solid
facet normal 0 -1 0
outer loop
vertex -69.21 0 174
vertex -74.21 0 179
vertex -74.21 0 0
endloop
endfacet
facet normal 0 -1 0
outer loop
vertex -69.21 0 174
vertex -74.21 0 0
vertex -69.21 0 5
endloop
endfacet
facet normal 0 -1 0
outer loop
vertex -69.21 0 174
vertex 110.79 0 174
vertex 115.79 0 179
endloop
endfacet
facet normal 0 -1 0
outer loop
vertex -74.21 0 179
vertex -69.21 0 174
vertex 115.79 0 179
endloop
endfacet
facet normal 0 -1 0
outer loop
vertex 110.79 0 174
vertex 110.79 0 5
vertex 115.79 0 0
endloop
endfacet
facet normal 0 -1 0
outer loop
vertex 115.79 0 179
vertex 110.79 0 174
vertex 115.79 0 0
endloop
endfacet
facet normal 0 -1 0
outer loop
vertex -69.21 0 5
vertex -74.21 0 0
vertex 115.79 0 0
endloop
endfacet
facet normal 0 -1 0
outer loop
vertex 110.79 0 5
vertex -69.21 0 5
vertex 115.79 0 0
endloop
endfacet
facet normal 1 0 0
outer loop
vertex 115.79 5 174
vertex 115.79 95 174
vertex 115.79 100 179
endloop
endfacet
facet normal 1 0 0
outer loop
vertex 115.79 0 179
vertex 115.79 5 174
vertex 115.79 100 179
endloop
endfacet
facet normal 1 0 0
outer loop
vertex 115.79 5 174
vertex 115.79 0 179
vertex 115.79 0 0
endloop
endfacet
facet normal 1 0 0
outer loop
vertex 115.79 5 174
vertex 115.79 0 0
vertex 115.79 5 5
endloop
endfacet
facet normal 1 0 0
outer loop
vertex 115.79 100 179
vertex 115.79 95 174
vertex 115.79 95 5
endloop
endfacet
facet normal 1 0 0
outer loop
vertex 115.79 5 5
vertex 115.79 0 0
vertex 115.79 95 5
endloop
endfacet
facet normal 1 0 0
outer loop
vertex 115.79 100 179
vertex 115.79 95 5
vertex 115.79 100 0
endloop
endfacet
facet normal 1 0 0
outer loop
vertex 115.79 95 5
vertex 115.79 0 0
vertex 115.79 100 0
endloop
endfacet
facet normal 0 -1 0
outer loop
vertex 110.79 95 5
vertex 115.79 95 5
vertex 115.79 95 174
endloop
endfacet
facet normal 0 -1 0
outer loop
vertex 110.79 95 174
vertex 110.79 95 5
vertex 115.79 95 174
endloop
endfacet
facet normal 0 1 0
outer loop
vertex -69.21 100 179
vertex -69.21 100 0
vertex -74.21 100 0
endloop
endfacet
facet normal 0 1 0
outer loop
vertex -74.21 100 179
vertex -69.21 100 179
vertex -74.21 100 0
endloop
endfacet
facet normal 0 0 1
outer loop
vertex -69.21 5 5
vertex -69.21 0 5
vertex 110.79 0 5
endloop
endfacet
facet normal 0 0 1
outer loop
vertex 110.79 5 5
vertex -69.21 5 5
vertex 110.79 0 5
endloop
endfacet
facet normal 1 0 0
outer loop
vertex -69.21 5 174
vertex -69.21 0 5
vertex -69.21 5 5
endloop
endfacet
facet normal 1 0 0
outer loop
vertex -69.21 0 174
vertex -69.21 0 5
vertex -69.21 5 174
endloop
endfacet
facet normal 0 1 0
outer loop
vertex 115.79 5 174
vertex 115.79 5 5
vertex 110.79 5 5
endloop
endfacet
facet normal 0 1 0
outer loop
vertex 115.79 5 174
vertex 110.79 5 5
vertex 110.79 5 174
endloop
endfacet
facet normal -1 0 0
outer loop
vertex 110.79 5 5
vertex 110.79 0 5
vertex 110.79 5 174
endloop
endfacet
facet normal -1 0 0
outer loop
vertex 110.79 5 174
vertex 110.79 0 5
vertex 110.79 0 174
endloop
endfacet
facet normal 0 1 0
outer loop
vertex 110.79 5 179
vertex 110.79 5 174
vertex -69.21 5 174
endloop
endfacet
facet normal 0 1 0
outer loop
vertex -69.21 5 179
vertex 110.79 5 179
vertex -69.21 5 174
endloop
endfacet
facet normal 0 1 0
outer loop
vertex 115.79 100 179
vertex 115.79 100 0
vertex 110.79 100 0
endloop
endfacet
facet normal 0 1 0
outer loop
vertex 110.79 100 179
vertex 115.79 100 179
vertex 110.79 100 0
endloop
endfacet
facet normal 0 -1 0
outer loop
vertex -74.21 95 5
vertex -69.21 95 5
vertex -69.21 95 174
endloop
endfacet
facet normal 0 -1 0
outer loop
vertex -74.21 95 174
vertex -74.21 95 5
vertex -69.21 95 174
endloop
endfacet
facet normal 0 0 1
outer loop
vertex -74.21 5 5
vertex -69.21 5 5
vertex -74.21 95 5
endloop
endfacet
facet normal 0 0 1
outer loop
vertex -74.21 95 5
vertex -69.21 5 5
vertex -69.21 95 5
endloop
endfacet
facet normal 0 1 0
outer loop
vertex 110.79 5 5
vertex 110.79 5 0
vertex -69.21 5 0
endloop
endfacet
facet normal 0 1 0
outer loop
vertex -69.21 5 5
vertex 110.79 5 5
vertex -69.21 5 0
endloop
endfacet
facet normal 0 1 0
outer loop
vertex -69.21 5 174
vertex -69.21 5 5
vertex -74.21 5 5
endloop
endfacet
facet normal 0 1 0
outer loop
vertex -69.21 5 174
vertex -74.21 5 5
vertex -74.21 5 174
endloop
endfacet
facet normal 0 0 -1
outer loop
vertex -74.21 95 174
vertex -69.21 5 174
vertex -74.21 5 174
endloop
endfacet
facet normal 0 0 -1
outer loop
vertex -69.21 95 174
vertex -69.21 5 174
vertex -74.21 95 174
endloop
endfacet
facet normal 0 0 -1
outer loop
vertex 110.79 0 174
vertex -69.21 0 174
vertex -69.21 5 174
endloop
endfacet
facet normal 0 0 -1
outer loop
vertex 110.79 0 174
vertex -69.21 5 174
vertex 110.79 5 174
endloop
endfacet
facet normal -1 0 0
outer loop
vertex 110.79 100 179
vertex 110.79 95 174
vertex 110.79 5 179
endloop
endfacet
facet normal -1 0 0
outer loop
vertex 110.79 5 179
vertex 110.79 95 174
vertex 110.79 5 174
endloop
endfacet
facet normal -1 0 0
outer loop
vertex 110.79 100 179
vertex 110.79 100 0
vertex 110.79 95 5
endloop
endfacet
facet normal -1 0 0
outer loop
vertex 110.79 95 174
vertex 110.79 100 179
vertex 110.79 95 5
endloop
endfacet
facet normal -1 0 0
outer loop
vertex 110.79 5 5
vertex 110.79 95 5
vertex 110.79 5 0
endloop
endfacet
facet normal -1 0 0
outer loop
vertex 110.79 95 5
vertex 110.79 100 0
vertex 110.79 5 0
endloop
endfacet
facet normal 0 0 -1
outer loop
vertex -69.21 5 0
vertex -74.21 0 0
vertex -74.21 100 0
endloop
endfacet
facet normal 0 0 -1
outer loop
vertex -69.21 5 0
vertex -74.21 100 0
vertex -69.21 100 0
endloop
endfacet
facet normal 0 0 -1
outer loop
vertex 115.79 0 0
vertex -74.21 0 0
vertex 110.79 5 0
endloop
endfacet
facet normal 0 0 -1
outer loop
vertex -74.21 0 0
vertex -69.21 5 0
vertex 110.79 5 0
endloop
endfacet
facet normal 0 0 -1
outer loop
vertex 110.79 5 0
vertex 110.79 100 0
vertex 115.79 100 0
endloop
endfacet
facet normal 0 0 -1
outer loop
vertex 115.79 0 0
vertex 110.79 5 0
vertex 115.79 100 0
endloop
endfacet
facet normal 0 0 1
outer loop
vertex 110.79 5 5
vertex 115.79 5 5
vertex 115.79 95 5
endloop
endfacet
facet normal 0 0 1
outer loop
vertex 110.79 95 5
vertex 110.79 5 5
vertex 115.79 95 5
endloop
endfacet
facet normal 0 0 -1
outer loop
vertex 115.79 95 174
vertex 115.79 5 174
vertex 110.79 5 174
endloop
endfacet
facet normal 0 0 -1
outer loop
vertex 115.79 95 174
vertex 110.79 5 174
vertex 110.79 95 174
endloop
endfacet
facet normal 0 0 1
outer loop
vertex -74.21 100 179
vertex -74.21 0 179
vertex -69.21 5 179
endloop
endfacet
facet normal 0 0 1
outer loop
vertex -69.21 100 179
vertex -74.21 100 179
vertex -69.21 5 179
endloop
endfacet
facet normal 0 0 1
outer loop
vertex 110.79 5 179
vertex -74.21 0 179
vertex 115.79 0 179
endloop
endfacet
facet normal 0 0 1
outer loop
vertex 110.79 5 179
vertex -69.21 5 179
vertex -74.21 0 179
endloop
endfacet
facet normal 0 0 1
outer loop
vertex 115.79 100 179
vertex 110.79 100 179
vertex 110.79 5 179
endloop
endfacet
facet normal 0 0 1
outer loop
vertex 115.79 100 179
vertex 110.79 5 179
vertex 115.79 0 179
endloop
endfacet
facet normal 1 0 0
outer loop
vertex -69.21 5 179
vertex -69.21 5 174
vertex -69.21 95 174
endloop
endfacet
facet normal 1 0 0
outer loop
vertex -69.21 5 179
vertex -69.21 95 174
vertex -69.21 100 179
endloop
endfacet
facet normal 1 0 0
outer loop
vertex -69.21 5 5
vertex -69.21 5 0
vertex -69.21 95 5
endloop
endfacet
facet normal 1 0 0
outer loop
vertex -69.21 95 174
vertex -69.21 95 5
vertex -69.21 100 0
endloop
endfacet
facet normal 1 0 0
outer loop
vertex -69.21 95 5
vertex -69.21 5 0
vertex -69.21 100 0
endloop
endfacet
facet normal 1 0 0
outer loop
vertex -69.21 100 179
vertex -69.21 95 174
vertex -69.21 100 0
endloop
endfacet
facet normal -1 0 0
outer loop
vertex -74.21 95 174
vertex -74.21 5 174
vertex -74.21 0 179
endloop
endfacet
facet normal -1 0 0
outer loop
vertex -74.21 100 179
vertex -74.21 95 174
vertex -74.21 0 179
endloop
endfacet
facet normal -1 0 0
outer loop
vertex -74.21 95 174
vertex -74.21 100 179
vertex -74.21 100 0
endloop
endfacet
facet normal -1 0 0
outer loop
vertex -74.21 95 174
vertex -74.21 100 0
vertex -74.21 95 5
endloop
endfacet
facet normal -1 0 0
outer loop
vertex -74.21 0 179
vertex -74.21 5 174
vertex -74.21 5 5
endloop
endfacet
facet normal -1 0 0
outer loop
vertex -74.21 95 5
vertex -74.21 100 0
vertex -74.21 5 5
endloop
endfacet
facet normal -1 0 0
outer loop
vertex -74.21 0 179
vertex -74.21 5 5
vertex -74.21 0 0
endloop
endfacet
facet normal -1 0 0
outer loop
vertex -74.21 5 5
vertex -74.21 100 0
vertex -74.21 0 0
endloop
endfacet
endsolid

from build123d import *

# Parameters (mm, degrees)
F1_DEPTH      = 179
F2_W          = 90.0000002235
F2_H          = 169.0000002235
F3_DEPTH      = 200
F3_DEPTH_BACK = 200
F4_W          = 180.0000002235
F4_H          = 169.0000002235
F5_DEPTH      = 25


# Not quite as in the source:
# - the program builds the solid bodies; features that only make, move or delete a surface that nothing else refers to are left out


with BuildPart() as f1:
    # F0 (on Top) → F1 (new body)
    with BuildSketch(Plane.XY):
        Polygon((-74.2097248461, 100), (-74.2097248461, 0), (115.7902751539, 0), (115.7902751539, 100), (110.7902751539, 100), (110.7902751539, 5), (-69.2097248461, 5), (-69.2097248461, 100), align=None)
    extrude(amount=F1_DEPTH)

    # F2 (on face) → F3 (cut, two sides)
    with BuildSketch(Plane.YZ.offset(115.7902751539)) as f3_sk:
        with Locations((50, 89.5)):
            Rectangle(F2_W, F2_H)
    extrude(amount=F3_DEPTH, mode=Mode.SUBTRACT)
    extrude(f3_sk.sketch, amount=-F3_DEPTH_BACK, mode=Mode.SUBTRACT)

    # F4 (on face) → F5 (cut)
    with BuildSketch(Plane.XZ):
        with Locations((20.7902751539, 89.5)):
            Rectangle(F4_W, F4_H)
    extrude(amount=-F5_DEPTH, mode=Mode.SUBTRACT)


solid = f1.part
